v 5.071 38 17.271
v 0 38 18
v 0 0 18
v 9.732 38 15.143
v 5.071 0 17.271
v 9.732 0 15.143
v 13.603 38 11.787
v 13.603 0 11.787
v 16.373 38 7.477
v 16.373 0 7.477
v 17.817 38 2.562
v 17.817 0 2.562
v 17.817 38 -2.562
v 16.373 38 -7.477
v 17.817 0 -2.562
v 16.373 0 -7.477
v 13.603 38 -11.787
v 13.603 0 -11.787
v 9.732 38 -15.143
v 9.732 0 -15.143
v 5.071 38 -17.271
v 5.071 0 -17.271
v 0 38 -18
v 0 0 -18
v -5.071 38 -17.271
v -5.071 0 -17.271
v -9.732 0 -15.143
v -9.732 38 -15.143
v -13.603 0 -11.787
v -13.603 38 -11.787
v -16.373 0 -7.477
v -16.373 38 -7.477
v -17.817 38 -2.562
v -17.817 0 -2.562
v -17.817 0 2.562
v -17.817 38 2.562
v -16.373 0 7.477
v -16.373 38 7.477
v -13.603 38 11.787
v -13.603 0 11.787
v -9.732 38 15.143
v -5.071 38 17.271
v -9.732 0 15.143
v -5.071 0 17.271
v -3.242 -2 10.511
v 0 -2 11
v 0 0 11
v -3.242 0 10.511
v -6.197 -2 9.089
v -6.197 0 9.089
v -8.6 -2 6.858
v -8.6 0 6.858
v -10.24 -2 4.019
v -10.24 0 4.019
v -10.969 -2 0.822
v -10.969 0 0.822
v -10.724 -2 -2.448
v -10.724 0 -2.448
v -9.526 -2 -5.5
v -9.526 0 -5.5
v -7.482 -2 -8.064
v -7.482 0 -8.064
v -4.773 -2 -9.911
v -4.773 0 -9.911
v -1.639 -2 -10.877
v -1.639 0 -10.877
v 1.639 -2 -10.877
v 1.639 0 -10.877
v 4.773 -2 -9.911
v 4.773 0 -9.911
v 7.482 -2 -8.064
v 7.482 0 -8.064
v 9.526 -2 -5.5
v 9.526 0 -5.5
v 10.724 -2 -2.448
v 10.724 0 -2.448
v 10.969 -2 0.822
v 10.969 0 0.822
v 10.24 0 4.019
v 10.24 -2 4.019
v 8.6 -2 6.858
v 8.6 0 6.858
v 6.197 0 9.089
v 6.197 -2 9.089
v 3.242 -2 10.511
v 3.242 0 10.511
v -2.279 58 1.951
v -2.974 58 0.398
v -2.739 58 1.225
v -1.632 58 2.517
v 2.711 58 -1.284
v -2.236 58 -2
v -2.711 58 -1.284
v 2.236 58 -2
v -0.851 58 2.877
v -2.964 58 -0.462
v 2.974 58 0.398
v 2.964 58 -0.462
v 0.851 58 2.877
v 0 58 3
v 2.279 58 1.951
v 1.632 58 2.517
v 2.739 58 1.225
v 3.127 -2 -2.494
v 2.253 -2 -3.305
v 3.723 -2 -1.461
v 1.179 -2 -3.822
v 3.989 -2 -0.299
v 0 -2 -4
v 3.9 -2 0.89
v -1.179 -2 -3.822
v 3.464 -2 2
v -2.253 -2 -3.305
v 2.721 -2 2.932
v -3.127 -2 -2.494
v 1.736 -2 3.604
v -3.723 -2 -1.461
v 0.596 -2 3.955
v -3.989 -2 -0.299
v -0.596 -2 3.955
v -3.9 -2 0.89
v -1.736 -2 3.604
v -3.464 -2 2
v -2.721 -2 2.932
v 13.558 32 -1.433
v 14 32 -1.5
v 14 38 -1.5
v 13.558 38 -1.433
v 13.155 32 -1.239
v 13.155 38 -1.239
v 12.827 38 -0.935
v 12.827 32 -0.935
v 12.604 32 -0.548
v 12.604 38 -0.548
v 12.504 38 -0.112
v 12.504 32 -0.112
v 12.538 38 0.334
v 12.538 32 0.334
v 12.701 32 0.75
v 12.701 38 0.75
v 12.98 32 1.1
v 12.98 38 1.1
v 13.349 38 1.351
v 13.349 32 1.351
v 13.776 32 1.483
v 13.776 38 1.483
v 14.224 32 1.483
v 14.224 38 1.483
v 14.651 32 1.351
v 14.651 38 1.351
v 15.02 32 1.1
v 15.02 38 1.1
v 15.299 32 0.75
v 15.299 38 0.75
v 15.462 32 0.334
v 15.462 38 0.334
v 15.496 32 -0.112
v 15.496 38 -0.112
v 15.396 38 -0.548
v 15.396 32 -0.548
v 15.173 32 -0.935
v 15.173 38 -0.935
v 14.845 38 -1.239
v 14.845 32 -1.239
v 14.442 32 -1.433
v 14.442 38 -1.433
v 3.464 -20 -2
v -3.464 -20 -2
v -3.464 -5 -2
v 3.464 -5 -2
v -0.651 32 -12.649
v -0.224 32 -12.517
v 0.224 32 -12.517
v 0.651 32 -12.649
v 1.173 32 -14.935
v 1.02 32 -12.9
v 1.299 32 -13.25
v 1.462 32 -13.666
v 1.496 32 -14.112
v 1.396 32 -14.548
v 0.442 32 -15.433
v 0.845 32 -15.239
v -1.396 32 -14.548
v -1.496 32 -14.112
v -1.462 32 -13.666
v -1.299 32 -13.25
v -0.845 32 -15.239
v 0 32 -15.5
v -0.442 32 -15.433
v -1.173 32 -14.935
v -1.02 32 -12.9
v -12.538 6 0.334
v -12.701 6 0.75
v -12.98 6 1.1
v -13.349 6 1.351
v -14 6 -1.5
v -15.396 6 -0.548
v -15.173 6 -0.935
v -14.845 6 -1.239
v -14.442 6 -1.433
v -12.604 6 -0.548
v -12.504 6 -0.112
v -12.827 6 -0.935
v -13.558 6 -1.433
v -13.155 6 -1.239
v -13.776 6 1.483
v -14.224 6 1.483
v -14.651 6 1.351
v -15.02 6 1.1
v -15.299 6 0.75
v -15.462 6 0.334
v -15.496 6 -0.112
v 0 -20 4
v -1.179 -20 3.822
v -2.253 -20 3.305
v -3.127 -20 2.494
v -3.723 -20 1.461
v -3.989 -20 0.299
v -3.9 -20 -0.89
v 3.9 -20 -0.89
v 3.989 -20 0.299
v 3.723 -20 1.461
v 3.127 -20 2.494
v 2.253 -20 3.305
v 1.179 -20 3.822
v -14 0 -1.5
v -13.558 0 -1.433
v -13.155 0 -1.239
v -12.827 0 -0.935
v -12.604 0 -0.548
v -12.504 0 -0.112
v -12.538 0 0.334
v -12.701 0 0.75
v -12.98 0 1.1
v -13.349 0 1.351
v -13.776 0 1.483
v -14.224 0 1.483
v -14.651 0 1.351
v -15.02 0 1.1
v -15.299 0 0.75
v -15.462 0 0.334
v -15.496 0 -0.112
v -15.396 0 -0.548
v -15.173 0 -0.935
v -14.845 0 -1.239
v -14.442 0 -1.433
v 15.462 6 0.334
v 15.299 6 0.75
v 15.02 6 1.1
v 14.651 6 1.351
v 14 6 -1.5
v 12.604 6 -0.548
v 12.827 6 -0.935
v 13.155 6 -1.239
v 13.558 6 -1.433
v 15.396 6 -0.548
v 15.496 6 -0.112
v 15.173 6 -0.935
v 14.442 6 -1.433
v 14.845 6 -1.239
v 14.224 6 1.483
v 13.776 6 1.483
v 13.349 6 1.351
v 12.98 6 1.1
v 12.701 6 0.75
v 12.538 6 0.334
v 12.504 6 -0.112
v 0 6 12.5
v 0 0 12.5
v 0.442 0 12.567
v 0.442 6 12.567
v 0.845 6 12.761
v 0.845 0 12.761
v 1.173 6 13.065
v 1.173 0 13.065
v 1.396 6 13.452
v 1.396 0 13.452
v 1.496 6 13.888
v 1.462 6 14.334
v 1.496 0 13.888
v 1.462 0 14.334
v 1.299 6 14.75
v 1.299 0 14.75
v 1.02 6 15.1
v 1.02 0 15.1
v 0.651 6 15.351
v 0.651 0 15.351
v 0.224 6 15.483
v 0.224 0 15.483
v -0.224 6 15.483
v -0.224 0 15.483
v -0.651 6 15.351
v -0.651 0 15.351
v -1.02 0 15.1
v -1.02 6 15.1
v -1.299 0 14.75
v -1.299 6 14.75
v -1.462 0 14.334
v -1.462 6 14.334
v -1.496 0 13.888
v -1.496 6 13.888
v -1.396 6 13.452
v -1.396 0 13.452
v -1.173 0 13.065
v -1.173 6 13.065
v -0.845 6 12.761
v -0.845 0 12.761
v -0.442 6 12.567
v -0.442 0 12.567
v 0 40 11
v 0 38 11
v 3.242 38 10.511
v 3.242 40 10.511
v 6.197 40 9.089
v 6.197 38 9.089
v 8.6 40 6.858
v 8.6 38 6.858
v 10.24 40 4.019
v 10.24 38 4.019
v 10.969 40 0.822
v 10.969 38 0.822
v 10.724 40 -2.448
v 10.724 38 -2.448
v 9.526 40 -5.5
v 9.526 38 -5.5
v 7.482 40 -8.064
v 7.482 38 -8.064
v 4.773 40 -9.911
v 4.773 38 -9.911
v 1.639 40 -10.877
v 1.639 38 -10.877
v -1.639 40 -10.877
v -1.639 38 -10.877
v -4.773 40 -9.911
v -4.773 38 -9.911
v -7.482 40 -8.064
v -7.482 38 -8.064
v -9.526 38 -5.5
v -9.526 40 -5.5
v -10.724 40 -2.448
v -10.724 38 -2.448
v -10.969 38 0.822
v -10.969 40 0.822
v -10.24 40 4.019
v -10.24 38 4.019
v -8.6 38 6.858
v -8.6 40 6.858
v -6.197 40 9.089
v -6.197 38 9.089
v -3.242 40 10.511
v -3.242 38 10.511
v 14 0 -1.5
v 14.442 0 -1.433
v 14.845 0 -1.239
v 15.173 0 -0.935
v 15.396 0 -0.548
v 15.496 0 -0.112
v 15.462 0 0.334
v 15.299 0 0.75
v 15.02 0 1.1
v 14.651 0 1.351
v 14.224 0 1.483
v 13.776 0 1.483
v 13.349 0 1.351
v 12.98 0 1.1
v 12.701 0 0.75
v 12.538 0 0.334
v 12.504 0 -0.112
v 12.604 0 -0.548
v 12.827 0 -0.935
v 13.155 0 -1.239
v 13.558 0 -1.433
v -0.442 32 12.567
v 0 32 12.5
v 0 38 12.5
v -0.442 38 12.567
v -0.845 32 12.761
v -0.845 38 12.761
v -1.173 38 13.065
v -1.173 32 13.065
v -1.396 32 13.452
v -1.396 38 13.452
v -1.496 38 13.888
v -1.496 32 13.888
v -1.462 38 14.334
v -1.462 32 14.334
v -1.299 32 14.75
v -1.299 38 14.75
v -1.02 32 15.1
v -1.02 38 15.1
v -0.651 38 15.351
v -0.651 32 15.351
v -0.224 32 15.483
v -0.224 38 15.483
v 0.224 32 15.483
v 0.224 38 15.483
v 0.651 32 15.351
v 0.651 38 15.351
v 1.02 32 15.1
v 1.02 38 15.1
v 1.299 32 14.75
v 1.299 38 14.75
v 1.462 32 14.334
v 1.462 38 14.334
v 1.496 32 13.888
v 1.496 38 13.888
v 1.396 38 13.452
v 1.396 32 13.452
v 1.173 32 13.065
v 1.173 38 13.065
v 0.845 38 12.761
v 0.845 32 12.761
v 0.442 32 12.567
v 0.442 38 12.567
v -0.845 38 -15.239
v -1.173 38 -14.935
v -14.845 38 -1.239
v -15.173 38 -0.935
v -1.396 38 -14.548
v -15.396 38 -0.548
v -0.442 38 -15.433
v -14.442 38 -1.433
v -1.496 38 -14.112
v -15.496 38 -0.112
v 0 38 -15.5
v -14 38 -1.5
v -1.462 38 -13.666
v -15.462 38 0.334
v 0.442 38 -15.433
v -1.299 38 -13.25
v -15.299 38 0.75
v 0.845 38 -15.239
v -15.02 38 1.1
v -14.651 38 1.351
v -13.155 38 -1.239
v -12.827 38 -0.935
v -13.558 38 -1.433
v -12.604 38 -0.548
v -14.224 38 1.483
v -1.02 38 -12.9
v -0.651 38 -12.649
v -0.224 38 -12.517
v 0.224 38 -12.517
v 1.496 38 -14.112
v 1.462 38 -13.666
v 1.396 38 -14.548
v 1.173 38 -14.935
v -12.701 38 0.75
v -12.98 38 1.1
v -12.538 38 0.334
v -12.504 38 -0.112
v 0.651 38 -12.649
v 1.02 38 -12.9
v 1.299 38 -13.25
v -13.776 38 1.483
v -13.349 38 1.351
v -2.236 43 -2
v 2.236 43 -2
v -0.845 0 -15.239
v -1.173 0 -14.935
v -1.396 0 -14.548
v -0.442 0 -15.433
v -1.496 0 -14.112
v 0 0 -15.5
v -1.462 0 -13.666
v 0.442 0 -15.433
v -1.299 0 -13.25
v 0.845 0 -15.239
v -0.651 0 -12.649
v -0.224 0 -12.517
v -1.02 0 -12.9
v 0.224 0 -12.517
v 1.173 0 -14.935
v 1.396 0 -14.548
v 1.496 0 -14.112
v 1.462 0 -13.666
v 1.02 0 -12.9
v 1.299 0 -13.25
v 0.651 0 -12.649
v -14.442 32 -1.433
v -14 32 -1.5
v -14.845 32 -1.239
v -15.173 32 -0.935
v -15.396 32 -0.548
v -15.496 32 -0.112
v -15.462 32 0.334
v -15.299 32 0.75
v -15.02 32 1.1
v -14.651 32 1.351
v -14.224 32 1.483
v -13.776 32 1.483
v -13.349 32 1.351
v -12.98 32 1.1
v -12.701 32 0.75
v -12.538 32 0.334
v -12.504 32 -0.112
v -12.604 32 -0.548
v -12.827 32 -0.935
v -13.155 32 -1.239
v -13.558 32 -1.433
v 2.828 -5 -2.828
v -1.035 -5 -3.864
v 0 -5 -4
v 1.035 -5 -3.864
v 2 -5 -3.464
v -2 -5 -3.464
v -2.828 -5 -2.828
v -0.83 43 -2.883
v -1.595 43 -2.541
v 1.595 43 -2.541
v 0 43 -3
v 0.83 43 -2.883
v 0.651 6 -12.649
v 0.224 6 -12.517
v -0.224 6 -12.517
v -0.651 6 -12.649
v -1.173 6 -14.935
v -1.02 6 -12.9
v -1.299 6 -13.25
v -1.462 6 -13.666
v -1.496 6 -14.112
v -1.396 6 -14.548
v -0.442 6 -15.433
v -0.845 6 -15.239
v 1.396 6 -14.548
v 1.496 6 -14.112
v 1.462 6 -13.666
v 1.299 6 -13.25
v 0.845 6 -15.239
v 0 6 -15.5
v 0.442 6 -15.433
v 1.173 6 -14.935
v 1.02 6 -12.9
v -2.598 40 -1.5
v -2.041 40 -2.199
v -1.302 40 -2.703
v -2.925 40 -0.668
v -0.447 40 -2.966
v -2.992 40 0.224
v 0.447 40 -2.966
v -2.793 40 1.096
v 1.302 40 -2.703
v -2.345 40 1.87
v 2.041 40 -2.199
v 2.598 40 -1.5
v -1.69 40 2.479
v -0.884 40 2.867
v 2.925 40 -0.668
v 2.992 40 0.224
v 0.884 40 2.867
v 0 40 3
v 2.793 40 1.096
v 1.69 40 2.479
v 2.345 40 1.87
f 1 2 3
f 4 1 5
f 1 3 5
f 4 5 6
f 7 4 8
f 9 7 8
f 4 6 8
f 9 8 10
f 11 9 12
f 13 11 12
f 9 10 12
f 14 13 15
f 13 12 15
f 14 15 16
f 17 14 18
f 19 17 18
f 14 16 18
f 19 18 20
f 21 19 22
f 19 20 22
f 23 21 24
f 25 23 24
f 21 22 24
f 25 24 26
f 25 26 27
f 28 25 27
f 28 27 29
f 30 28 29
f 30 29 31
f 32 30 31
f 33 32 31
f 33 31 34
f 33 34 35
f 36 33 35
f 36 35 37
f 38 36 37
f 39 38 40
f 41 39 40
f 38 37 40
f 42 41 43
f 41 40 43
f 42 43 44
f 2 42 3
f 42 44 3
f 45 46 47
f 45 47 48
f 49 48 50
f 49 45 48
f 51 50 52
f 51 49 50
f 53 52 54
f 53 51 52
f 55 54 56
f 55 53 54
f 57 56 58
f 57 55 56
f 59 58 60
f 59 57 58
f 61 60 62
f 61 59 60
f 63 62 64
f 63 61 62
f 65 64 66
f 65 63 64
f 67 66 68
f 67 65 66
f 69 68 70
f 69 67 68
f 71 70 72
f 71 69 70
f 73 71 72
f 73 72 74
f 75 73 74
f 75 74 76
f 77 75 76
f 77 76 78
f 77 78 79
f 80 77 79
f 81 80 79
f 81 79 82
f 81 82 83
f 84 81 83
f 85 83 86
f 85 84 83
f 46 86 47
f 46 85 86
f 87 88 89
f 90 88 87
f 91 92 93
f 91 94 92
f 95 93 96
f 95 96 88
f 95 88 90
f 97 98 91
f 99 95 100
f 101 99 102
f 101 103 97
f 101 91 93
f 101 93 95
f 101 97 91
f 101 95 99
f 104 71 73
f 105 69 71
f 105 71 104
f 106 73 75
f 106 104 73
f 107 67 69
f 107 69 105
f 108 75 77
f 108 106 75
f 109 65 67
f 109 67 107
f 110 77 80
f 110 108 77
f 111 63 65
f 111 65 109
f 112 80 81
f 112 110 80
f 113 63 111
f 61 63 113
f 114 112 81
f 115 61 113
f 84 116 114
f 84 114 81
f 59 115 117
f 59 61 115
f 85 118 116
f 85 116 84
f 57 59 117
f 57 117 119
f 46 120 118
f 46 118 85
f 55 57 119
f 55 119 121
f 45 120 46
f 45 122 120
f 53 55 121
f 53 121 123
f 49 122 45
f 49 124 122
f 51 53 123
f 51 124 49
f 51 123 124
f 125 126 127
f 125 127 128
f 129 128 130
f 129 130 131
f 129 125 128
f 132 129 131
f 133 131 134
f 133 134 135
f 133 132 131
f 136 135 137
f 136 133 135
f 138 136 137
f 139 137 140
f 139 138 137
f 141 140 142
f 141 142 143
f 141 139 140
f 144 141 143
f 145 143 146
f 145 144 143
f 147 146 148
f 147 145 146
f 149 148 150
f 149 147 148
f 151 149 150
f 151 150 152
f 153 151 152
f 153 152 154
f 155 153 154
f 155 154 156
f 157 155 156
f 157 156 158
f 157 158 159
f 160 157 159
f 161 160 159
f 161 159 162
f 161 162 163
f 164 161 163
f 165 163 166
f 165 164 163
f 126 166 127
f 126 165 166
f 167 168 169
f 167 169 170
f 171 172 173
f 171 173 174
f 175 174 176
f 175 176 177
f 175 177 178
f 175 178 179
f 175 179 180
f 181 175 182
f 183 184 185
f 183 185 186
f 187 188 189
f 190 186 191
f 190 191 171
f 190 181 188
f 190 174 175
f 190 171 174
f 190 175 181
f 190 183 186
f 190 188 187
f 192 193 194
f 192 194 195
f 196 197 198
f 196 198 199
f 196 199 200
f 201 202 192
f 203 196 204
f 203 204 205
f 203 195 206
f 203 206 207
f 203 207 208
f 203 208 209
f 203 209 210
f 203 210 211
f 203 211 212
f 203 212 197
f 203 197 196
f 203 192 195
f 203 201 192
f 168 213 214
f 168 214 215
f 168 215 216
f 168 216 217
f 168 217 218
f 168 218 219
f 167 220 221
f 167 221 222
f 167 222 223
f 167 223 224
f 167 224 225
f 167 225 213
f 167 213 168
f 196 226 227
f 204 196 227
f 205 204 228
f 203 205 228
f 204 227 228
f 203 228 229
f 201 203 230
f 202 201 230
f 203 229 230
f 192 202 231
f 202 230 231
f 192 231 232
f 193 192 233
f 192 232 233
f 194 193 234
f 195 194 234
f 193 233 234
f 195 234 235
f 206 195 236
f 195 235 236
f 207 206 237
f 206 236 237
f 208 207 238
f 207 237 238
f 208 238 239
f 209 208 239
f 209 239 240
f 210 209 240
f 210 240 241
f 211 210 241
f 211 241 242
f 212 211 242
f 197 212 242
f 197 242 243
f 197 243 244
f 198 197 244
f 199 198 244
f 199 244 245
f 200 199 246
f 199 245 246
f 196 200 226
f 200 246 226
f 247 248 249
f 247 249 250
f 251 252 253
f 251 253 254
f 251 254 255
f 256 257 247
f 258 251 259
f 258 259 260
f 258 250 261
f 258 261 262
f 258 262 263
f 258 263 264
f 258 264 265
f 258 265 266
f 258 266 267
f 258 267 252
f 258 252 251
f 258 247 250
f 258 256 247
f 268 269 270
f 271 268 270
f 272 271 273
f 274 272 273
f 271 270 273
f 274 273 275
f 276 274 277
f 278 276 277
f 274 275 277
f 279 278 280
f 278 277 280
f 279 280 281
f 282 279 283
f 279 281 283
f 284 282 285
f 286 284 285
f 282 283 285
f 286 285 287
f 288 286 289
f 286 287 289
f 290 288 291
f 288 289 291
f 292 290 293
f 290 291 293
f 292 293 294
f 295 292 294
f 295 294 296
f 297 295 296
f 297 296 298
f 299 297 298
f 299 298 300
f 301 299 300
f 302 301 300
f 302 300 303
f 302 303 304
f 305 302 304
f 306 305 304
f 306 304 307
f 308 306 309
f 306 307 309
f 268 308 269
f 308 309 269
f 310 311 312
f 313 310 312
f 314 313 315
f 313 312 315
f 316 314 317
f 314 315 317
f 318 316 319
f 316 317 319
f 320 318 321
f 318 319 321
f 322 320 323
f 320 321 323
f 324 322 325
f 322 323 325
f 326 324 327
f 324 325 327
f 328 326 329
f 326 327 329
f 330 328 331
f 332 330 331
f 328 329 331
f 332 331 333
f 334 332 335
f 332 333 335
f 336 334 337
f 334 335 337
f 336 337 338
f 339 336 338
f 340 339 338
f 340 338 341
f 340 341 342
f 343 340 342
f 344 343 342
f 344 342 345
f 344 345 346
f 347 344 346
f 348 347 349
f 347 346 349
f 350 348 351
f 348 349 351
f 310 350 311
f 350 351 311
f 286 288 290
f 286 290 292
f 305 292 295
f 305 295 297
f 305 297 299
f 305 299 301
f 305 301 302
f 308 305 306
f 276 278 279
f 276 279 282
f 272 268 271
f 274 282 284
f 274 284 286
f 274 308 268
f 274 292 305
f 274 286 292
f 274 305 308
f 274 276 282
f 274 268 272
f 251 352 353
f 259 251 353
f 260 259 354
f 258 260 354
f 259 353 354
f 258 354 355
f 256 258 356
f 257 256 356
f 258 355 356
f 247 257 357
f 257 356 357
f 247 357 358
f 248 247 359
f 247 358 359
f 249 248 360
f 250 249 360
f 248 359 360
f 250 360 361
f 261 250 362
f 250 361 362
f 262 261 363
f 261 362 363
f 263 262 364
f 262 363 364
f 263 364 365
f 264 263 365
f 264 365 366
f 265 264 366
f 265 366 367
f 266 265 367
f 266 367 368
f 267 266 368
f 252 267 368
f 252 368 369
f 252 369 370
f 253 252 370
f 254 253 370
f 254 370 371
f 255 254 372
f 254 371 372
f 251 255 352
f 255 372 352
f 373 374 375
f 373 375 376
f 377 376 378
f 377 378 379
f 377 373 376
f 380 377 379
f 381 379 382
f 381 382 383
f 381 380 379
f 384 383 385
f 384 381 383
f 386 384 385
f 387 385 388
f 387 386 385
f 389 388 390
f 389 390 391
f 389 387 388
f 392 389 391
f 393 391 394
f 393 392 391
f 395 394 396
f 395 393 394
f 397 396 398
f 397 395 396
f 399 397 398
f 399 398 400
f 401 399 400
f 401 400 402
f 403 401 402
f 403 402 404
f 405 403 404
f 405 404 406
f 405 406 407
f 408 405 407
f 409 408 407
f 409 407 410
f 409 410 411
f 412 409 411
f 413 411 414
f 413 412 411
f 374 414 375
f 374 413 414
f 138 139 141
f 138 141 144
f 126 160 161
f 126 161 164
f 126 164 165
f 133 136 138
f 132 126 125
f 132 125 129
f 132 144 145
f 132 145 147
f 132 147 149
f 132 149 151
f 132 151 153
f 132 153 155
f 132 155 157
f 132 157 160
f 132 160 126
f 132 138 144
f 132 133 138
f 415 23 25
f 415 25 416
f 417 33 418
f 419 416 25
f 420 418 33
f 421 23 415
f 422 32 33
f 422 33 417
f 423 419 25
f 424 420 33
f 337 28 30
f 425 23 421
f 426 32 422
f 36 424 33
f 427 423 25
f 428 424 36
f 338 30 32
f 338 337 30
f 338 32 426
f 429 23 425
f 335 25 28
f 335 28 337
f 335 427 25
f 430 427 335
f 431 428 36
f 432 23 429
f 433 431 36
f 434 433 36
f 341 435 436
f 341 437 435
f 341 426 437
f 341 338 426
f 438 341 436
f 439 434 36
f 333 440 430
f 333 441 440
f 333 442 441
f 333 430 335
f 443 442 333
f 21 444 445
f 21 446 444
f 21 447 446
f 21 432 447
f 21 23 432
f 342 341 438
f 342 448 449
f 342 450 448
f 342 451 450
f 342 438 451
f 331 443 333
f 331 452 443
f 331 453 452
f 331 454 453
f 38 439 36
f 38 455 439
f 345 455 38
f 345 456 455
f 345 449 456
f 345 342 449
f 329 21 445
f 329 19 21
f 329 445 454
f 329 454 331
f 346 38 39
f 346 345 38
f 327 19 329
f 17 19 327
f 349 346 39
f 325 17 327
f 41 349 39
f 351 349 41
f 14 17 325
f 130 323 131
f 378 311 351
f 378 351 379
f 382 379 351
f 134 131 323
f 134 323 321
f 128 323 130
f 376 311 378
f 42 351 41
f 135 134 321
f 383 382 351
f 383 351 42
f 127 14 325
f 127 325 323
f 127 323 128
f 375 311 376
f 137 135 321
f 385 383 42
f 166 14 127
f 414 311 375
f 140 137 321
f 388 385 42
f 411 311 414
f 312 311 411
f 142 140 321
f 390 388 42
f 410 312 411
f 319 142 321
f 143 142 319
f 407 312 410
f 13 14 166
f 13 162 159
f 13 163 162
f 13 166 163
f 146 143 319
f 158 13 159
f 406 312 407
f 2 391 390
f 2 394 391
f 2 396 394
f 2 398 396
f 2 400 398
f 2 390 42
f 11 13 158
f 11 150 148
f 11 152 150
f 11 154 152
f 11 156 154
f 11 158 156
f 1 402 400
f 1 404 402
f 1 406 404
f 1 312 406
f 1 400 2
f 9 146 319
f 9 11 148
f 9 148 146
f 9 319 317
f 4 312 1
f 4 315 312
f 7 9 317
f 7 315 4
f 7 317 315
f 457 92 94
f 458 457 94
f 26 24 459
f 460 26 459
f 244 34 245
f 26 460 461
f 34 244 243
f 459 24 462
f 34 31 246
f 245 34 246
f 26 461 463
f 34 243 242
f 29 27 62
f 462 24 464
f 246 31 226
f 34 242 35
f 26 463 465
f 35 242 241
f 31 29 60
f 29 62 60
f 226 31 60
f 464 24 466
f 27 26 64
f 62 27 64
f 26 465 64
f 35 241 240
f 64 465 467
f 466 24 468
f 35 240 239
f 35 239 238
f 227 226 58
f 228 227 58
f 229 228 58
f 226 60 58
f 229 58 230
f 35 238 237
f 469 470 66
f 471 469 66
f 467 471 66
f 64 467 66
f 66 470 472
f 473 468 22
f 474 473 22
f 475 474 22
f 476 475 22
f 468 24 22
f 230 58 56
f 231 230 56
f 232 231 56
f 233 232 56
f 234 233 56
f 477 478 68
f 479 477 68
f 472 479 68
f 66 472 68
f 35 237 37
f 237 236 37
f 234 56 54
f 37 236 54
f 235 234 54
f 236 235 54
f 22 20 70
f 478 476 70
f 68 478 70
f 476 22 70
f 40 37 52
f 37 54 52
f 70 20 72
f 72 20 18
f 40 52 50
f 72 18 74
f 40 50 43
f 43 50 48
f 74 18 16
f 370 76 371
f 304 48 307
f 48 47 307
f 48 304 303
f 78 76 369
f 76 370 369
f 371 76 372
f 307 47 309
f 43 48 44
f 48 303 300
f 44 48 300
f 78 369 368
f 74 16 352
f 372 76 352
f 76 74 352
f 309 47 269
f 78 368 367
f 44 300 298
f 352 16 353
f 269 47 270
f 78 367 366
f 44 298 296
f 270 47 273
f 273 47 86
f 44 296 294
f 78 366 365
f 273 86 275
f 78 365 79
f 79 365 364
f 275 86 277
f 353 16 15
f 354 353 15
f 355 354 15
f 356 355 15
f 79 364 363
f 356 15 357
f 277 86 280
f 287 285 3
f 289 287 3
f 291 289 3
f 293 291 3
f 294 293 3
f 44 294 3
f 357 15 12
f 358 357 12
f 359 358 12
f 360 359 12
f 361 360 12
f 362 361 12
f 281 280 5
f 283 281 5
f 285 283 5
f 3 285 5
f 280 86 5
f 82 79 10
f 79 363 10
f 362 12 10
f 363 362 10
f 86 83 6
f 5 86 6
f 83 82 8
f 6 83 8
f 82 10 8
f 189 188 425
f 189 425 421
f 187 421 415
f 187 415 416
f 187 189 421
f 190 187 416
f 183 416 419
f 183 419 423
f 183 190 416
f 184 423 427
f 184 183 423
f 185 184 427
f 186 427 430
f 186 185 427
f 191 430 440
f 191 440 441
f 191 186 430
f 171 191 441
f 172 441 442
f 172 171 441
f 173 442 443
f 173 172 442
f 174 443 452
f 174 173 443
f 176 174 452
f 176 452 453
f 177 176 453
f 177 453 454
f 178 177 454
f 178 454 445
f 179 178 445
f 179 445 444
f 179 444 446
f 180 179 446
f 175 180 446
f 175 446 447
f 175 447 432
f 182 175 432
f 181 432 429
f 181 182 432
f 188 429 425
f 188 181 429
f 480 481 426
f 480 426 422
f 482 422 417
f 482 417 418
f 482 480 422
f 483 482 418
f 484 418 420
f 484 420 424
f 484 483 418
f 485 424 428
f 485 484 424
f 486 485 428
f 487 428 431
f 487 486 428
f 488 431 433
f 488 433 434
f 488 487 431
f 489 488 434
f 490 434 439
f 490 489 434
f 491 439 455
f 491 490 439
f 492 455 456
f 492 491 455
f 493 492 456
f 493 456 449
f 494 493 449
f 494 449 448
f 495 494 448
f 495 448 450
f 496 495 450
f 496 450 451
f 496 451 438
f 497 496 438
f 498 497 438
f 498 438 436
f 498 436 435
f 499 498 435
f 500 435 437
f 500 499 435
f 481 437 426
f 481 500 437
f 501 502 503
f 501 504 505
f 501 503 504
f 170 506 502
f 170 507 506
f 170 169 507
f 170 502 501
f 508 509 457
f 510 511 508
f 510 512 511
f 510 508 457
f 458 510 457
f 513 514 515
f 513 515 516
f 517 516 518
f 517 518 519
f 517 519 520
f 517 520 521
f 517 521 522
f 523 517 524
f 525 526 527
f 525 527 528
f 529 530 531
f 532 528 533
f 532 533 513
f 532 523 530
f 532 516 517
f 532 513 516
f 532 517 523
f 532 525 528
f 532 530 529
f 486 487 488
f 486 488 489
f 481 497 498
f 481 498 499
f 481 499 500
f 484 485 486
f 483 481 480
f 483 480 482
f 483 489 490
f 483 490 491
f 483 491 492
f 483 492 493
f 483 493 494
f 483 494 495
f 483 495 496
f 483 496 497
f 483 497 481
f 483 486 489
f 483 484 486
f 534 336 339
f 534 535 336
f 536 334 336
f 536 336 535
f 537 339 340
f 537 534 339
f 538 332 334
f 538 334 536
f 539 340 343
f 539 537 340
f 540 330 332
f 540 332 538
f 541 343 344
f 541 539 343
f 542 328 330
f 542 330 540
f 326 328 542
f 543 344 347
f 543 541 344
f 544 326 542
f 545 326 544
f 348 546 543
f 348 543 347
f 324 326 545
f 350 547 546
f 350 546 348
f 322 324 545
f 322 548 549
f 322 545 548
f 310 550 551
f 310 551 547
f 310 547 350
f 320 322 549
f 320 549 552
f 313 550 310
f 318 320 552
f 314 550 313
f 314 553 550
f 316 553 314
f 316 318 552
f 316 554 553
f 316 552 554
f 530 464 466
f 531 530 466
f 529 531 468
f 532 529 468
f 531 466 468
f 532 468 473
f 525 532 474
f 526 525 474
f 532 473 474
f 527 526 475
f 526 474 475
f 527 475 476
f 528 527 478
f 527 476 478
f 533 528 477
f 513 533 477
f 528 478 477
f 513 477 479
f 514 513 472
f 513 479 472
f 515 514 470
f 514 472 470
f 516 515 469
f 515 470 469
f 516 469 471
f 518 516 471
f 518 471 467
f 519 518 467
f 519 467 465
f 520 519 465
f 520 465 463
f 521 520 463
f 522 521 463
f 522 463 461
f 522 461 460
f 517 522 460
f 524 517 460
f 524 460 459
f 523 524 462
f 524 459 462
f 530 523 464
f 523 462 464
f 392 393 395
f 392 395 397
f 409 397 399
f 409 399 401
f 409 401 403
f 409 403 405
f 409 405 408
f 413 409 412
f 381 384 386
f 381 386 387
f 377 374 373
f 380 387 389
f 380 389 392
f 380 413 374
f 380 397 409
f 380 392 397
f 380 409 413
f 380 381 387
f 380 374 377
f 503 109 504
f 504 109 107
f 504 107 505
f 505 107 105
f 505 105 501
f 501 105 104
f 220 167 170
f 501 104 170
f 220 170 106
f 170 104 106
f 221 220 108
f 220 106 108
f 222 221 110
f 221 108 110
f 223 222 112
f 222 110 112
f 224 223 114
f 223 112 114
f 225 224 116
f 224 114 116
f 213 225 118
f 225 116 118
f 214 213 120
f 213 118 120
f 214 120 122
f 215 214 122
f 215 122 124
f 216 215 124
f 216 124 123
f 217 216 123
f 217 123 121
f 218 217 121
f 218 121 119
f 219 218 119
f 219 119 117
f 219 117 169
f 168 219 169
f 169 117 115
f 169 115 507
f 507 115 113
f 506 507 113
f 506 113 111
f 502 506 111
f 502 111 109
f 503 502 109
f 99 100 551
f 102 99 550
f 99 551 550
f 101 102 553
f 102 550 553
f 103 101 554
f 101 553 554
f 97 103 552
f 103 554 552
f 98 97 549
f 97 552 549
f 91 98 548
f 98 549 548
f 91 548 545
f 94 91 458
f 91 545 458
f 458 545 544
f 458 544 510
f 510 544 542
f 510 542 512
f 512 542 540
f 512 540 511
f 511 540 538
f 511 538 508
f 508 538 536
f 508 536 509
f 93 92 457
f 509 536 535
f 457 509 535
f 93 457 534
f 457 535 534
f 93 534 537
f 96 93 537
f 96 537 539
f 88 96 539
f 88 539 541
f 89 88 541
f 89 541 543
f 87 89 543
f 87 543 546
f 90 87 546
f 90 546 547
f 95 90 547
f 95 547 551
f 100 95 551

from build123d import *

# Parameters (mm, degrees)
SKETCH_1_R          = 18
EXTRUDE_1_DEPTH     = 38
SKETCH_2_R          = 11
EXTRUDE_2_DEPTH     = 2
EXTRUDE_START       = 2
SKETCH_3_R          = 11
EXTRUDE_3_DEPTH     = 2
SKETCH_4_R          = 4
EXTRUDE_4_DEPTH     = 18
SKETCH_5_R          = 3
EXTRUDE_5_DEPTH     = 18
SKETCH_6_W          = 9.252434457
SKETCH_6_H          = 4.602247191
CUT_EXTRUDE_1_DEPTH = 15
SKETCH_7_W          = 9.252434457
SKETCH_7_H          = 4.602247191
CUT_EXTRUDE_2_DEPTH = 15
SKETCH_8_R          = 1.5
CUT_EXTRUDE_3_DEPTH = 6
CUT_EXTRUDE_START   = -6
SKETCH_9_R          = 1.5
CUT_EXTRUDE_4_DEPTH = 6


with BuildPart() as part:
    # 草图1 → 凸台-拉伸1 (new body)
    with BuildSketch(Plane(origin=(0, 0, 0), x_dir=(1, 0, 0), z_dir=(0, 1, 0))):
        with Locations(Location((0, 0, 0), (0, 0, 270))):
            Circle(SKETCH_1_R)
    extrude(amount=EXTRUDE_1_DEPTH)

    # 草图2 → 凸台-拉伸2 (add)
    with BuildSketch(Plane(origin=(0, 38, 0), x_dir=(1, 0, 0), z_dir=(0, 1, 0))):
        with Locations(Location((0, 0, 0), (0, 0, 270))):
            Circle(SKETCH_2_R)
    extrude(amount=EXTRUDE_2_DEPTH)

    # 草图3 → 凸台-拉伸3 (add)
    with BuildSketch(Plane.XZ.offset(EXTRUDE_START)):
        with Locations(Location((0, 0, 0), (0, 0, 90))):
            Circle(SKETCH_3_R)
    extrude(amount=-EXTRUDE_3_DEPTH)

    # 草图4 → 凸台-拉伸4 (add)
    with BuildSketch(Plane.XZ.offset(2)):
        with Locations(Location((0, 0, 0), (0, 0, 270))):
            Circle(SKETCH_4_R)
    extrude(amount=EXTRUDE_4_DEPTH)

    # 草图5 → 凸台-拉伸5 (add)
    with BuildSketch(Plane(origin=(0, 40, 0), x_dir=(1, 0, 0), z_dir=(0, 1, 0))):
        with Locations(Location((0, 0, 0), (0, 0, 270))):
            Circle(SKETCH_5_R)
    extrude(amount=EXTRUDE_5_DEPTH)

    # 草图6 → 切除-拉伸1 (cut)
    with BuildSketch(Plane(origin=(0, 58, 0), x_dir=(1, 0, 0), z_dir=(0, 1, 0))):
        with Locations((-0.167790263, 4.301123596)):
            Rectangle(SKETCH_6_W, SKETCH_6_H)
    extrude(amount=-CUT_EXTRUDE_1_DEPTH, mode=Mode.SUBTRACT)

    # 草图7 → 切除-拉伸2 (cut)
    with BuildSketch(Plane.XZ.offset(20)):
        with Locations((-0.167790263, -4.301123596)):
            Rectangle(SKETCH_7_W, SKETCH_7_H)
    extrude(amount=-CUT_EXTRUDE_2_DEPTH, mode=Mode.SUBTRACT)

    # 草图8 → 切除-拉伸3 (cut)
    with BuildSketch(Plane.XZ):
        with Locations(Location((0, 14, 0), (0, 0, 270))):
            Circle(SKETCH_8_R)
        with Locations(Location((14, 0, 0), (0, 0, 270))):
            Circle(SKETCH_8_R)
        with Locations(Location((0, -14, 0), (0, 0, 270))):
            Circle(SKETCH_8_R)
        with Locations(Location((-14, 0, 0), (0, 0, 270))):
            Circle(SKETCH_8_R)
    extrude(amount=-CUT_EXTRUDE_3_DEPTH, mode=Mode.SUBTRACT)

    # 草图9 → 切除-拉伸4 (cut)
    with BuildSketch(Plane(origin=(0, 38, 0), x_dir=(1, 0, 0), z_dir=(0, 1, 0)).offset(CUT_EXTRUDE_START)):
        with Locations(Location((-14, 0, 0), (0, 0, 90))):
            Circle(SKETCH_9_R)
        with Locations(Location((0, 14, 0), (0, 0, 90))):
            Circle(SKETCH_9_R)
        with Locations(Location((14, 0, 0), (0, 0, 90))):
            Circle(SKETCH_9_R)
        with Locations(Location((0, -14, 0), (0, 0, 90))):
            Circle(SKETCH_9_R)
    extrude(amount=CUT_EXTRUDE_4_DEPTH, mode=Mode.SUBTRACT)


solid = part.part
